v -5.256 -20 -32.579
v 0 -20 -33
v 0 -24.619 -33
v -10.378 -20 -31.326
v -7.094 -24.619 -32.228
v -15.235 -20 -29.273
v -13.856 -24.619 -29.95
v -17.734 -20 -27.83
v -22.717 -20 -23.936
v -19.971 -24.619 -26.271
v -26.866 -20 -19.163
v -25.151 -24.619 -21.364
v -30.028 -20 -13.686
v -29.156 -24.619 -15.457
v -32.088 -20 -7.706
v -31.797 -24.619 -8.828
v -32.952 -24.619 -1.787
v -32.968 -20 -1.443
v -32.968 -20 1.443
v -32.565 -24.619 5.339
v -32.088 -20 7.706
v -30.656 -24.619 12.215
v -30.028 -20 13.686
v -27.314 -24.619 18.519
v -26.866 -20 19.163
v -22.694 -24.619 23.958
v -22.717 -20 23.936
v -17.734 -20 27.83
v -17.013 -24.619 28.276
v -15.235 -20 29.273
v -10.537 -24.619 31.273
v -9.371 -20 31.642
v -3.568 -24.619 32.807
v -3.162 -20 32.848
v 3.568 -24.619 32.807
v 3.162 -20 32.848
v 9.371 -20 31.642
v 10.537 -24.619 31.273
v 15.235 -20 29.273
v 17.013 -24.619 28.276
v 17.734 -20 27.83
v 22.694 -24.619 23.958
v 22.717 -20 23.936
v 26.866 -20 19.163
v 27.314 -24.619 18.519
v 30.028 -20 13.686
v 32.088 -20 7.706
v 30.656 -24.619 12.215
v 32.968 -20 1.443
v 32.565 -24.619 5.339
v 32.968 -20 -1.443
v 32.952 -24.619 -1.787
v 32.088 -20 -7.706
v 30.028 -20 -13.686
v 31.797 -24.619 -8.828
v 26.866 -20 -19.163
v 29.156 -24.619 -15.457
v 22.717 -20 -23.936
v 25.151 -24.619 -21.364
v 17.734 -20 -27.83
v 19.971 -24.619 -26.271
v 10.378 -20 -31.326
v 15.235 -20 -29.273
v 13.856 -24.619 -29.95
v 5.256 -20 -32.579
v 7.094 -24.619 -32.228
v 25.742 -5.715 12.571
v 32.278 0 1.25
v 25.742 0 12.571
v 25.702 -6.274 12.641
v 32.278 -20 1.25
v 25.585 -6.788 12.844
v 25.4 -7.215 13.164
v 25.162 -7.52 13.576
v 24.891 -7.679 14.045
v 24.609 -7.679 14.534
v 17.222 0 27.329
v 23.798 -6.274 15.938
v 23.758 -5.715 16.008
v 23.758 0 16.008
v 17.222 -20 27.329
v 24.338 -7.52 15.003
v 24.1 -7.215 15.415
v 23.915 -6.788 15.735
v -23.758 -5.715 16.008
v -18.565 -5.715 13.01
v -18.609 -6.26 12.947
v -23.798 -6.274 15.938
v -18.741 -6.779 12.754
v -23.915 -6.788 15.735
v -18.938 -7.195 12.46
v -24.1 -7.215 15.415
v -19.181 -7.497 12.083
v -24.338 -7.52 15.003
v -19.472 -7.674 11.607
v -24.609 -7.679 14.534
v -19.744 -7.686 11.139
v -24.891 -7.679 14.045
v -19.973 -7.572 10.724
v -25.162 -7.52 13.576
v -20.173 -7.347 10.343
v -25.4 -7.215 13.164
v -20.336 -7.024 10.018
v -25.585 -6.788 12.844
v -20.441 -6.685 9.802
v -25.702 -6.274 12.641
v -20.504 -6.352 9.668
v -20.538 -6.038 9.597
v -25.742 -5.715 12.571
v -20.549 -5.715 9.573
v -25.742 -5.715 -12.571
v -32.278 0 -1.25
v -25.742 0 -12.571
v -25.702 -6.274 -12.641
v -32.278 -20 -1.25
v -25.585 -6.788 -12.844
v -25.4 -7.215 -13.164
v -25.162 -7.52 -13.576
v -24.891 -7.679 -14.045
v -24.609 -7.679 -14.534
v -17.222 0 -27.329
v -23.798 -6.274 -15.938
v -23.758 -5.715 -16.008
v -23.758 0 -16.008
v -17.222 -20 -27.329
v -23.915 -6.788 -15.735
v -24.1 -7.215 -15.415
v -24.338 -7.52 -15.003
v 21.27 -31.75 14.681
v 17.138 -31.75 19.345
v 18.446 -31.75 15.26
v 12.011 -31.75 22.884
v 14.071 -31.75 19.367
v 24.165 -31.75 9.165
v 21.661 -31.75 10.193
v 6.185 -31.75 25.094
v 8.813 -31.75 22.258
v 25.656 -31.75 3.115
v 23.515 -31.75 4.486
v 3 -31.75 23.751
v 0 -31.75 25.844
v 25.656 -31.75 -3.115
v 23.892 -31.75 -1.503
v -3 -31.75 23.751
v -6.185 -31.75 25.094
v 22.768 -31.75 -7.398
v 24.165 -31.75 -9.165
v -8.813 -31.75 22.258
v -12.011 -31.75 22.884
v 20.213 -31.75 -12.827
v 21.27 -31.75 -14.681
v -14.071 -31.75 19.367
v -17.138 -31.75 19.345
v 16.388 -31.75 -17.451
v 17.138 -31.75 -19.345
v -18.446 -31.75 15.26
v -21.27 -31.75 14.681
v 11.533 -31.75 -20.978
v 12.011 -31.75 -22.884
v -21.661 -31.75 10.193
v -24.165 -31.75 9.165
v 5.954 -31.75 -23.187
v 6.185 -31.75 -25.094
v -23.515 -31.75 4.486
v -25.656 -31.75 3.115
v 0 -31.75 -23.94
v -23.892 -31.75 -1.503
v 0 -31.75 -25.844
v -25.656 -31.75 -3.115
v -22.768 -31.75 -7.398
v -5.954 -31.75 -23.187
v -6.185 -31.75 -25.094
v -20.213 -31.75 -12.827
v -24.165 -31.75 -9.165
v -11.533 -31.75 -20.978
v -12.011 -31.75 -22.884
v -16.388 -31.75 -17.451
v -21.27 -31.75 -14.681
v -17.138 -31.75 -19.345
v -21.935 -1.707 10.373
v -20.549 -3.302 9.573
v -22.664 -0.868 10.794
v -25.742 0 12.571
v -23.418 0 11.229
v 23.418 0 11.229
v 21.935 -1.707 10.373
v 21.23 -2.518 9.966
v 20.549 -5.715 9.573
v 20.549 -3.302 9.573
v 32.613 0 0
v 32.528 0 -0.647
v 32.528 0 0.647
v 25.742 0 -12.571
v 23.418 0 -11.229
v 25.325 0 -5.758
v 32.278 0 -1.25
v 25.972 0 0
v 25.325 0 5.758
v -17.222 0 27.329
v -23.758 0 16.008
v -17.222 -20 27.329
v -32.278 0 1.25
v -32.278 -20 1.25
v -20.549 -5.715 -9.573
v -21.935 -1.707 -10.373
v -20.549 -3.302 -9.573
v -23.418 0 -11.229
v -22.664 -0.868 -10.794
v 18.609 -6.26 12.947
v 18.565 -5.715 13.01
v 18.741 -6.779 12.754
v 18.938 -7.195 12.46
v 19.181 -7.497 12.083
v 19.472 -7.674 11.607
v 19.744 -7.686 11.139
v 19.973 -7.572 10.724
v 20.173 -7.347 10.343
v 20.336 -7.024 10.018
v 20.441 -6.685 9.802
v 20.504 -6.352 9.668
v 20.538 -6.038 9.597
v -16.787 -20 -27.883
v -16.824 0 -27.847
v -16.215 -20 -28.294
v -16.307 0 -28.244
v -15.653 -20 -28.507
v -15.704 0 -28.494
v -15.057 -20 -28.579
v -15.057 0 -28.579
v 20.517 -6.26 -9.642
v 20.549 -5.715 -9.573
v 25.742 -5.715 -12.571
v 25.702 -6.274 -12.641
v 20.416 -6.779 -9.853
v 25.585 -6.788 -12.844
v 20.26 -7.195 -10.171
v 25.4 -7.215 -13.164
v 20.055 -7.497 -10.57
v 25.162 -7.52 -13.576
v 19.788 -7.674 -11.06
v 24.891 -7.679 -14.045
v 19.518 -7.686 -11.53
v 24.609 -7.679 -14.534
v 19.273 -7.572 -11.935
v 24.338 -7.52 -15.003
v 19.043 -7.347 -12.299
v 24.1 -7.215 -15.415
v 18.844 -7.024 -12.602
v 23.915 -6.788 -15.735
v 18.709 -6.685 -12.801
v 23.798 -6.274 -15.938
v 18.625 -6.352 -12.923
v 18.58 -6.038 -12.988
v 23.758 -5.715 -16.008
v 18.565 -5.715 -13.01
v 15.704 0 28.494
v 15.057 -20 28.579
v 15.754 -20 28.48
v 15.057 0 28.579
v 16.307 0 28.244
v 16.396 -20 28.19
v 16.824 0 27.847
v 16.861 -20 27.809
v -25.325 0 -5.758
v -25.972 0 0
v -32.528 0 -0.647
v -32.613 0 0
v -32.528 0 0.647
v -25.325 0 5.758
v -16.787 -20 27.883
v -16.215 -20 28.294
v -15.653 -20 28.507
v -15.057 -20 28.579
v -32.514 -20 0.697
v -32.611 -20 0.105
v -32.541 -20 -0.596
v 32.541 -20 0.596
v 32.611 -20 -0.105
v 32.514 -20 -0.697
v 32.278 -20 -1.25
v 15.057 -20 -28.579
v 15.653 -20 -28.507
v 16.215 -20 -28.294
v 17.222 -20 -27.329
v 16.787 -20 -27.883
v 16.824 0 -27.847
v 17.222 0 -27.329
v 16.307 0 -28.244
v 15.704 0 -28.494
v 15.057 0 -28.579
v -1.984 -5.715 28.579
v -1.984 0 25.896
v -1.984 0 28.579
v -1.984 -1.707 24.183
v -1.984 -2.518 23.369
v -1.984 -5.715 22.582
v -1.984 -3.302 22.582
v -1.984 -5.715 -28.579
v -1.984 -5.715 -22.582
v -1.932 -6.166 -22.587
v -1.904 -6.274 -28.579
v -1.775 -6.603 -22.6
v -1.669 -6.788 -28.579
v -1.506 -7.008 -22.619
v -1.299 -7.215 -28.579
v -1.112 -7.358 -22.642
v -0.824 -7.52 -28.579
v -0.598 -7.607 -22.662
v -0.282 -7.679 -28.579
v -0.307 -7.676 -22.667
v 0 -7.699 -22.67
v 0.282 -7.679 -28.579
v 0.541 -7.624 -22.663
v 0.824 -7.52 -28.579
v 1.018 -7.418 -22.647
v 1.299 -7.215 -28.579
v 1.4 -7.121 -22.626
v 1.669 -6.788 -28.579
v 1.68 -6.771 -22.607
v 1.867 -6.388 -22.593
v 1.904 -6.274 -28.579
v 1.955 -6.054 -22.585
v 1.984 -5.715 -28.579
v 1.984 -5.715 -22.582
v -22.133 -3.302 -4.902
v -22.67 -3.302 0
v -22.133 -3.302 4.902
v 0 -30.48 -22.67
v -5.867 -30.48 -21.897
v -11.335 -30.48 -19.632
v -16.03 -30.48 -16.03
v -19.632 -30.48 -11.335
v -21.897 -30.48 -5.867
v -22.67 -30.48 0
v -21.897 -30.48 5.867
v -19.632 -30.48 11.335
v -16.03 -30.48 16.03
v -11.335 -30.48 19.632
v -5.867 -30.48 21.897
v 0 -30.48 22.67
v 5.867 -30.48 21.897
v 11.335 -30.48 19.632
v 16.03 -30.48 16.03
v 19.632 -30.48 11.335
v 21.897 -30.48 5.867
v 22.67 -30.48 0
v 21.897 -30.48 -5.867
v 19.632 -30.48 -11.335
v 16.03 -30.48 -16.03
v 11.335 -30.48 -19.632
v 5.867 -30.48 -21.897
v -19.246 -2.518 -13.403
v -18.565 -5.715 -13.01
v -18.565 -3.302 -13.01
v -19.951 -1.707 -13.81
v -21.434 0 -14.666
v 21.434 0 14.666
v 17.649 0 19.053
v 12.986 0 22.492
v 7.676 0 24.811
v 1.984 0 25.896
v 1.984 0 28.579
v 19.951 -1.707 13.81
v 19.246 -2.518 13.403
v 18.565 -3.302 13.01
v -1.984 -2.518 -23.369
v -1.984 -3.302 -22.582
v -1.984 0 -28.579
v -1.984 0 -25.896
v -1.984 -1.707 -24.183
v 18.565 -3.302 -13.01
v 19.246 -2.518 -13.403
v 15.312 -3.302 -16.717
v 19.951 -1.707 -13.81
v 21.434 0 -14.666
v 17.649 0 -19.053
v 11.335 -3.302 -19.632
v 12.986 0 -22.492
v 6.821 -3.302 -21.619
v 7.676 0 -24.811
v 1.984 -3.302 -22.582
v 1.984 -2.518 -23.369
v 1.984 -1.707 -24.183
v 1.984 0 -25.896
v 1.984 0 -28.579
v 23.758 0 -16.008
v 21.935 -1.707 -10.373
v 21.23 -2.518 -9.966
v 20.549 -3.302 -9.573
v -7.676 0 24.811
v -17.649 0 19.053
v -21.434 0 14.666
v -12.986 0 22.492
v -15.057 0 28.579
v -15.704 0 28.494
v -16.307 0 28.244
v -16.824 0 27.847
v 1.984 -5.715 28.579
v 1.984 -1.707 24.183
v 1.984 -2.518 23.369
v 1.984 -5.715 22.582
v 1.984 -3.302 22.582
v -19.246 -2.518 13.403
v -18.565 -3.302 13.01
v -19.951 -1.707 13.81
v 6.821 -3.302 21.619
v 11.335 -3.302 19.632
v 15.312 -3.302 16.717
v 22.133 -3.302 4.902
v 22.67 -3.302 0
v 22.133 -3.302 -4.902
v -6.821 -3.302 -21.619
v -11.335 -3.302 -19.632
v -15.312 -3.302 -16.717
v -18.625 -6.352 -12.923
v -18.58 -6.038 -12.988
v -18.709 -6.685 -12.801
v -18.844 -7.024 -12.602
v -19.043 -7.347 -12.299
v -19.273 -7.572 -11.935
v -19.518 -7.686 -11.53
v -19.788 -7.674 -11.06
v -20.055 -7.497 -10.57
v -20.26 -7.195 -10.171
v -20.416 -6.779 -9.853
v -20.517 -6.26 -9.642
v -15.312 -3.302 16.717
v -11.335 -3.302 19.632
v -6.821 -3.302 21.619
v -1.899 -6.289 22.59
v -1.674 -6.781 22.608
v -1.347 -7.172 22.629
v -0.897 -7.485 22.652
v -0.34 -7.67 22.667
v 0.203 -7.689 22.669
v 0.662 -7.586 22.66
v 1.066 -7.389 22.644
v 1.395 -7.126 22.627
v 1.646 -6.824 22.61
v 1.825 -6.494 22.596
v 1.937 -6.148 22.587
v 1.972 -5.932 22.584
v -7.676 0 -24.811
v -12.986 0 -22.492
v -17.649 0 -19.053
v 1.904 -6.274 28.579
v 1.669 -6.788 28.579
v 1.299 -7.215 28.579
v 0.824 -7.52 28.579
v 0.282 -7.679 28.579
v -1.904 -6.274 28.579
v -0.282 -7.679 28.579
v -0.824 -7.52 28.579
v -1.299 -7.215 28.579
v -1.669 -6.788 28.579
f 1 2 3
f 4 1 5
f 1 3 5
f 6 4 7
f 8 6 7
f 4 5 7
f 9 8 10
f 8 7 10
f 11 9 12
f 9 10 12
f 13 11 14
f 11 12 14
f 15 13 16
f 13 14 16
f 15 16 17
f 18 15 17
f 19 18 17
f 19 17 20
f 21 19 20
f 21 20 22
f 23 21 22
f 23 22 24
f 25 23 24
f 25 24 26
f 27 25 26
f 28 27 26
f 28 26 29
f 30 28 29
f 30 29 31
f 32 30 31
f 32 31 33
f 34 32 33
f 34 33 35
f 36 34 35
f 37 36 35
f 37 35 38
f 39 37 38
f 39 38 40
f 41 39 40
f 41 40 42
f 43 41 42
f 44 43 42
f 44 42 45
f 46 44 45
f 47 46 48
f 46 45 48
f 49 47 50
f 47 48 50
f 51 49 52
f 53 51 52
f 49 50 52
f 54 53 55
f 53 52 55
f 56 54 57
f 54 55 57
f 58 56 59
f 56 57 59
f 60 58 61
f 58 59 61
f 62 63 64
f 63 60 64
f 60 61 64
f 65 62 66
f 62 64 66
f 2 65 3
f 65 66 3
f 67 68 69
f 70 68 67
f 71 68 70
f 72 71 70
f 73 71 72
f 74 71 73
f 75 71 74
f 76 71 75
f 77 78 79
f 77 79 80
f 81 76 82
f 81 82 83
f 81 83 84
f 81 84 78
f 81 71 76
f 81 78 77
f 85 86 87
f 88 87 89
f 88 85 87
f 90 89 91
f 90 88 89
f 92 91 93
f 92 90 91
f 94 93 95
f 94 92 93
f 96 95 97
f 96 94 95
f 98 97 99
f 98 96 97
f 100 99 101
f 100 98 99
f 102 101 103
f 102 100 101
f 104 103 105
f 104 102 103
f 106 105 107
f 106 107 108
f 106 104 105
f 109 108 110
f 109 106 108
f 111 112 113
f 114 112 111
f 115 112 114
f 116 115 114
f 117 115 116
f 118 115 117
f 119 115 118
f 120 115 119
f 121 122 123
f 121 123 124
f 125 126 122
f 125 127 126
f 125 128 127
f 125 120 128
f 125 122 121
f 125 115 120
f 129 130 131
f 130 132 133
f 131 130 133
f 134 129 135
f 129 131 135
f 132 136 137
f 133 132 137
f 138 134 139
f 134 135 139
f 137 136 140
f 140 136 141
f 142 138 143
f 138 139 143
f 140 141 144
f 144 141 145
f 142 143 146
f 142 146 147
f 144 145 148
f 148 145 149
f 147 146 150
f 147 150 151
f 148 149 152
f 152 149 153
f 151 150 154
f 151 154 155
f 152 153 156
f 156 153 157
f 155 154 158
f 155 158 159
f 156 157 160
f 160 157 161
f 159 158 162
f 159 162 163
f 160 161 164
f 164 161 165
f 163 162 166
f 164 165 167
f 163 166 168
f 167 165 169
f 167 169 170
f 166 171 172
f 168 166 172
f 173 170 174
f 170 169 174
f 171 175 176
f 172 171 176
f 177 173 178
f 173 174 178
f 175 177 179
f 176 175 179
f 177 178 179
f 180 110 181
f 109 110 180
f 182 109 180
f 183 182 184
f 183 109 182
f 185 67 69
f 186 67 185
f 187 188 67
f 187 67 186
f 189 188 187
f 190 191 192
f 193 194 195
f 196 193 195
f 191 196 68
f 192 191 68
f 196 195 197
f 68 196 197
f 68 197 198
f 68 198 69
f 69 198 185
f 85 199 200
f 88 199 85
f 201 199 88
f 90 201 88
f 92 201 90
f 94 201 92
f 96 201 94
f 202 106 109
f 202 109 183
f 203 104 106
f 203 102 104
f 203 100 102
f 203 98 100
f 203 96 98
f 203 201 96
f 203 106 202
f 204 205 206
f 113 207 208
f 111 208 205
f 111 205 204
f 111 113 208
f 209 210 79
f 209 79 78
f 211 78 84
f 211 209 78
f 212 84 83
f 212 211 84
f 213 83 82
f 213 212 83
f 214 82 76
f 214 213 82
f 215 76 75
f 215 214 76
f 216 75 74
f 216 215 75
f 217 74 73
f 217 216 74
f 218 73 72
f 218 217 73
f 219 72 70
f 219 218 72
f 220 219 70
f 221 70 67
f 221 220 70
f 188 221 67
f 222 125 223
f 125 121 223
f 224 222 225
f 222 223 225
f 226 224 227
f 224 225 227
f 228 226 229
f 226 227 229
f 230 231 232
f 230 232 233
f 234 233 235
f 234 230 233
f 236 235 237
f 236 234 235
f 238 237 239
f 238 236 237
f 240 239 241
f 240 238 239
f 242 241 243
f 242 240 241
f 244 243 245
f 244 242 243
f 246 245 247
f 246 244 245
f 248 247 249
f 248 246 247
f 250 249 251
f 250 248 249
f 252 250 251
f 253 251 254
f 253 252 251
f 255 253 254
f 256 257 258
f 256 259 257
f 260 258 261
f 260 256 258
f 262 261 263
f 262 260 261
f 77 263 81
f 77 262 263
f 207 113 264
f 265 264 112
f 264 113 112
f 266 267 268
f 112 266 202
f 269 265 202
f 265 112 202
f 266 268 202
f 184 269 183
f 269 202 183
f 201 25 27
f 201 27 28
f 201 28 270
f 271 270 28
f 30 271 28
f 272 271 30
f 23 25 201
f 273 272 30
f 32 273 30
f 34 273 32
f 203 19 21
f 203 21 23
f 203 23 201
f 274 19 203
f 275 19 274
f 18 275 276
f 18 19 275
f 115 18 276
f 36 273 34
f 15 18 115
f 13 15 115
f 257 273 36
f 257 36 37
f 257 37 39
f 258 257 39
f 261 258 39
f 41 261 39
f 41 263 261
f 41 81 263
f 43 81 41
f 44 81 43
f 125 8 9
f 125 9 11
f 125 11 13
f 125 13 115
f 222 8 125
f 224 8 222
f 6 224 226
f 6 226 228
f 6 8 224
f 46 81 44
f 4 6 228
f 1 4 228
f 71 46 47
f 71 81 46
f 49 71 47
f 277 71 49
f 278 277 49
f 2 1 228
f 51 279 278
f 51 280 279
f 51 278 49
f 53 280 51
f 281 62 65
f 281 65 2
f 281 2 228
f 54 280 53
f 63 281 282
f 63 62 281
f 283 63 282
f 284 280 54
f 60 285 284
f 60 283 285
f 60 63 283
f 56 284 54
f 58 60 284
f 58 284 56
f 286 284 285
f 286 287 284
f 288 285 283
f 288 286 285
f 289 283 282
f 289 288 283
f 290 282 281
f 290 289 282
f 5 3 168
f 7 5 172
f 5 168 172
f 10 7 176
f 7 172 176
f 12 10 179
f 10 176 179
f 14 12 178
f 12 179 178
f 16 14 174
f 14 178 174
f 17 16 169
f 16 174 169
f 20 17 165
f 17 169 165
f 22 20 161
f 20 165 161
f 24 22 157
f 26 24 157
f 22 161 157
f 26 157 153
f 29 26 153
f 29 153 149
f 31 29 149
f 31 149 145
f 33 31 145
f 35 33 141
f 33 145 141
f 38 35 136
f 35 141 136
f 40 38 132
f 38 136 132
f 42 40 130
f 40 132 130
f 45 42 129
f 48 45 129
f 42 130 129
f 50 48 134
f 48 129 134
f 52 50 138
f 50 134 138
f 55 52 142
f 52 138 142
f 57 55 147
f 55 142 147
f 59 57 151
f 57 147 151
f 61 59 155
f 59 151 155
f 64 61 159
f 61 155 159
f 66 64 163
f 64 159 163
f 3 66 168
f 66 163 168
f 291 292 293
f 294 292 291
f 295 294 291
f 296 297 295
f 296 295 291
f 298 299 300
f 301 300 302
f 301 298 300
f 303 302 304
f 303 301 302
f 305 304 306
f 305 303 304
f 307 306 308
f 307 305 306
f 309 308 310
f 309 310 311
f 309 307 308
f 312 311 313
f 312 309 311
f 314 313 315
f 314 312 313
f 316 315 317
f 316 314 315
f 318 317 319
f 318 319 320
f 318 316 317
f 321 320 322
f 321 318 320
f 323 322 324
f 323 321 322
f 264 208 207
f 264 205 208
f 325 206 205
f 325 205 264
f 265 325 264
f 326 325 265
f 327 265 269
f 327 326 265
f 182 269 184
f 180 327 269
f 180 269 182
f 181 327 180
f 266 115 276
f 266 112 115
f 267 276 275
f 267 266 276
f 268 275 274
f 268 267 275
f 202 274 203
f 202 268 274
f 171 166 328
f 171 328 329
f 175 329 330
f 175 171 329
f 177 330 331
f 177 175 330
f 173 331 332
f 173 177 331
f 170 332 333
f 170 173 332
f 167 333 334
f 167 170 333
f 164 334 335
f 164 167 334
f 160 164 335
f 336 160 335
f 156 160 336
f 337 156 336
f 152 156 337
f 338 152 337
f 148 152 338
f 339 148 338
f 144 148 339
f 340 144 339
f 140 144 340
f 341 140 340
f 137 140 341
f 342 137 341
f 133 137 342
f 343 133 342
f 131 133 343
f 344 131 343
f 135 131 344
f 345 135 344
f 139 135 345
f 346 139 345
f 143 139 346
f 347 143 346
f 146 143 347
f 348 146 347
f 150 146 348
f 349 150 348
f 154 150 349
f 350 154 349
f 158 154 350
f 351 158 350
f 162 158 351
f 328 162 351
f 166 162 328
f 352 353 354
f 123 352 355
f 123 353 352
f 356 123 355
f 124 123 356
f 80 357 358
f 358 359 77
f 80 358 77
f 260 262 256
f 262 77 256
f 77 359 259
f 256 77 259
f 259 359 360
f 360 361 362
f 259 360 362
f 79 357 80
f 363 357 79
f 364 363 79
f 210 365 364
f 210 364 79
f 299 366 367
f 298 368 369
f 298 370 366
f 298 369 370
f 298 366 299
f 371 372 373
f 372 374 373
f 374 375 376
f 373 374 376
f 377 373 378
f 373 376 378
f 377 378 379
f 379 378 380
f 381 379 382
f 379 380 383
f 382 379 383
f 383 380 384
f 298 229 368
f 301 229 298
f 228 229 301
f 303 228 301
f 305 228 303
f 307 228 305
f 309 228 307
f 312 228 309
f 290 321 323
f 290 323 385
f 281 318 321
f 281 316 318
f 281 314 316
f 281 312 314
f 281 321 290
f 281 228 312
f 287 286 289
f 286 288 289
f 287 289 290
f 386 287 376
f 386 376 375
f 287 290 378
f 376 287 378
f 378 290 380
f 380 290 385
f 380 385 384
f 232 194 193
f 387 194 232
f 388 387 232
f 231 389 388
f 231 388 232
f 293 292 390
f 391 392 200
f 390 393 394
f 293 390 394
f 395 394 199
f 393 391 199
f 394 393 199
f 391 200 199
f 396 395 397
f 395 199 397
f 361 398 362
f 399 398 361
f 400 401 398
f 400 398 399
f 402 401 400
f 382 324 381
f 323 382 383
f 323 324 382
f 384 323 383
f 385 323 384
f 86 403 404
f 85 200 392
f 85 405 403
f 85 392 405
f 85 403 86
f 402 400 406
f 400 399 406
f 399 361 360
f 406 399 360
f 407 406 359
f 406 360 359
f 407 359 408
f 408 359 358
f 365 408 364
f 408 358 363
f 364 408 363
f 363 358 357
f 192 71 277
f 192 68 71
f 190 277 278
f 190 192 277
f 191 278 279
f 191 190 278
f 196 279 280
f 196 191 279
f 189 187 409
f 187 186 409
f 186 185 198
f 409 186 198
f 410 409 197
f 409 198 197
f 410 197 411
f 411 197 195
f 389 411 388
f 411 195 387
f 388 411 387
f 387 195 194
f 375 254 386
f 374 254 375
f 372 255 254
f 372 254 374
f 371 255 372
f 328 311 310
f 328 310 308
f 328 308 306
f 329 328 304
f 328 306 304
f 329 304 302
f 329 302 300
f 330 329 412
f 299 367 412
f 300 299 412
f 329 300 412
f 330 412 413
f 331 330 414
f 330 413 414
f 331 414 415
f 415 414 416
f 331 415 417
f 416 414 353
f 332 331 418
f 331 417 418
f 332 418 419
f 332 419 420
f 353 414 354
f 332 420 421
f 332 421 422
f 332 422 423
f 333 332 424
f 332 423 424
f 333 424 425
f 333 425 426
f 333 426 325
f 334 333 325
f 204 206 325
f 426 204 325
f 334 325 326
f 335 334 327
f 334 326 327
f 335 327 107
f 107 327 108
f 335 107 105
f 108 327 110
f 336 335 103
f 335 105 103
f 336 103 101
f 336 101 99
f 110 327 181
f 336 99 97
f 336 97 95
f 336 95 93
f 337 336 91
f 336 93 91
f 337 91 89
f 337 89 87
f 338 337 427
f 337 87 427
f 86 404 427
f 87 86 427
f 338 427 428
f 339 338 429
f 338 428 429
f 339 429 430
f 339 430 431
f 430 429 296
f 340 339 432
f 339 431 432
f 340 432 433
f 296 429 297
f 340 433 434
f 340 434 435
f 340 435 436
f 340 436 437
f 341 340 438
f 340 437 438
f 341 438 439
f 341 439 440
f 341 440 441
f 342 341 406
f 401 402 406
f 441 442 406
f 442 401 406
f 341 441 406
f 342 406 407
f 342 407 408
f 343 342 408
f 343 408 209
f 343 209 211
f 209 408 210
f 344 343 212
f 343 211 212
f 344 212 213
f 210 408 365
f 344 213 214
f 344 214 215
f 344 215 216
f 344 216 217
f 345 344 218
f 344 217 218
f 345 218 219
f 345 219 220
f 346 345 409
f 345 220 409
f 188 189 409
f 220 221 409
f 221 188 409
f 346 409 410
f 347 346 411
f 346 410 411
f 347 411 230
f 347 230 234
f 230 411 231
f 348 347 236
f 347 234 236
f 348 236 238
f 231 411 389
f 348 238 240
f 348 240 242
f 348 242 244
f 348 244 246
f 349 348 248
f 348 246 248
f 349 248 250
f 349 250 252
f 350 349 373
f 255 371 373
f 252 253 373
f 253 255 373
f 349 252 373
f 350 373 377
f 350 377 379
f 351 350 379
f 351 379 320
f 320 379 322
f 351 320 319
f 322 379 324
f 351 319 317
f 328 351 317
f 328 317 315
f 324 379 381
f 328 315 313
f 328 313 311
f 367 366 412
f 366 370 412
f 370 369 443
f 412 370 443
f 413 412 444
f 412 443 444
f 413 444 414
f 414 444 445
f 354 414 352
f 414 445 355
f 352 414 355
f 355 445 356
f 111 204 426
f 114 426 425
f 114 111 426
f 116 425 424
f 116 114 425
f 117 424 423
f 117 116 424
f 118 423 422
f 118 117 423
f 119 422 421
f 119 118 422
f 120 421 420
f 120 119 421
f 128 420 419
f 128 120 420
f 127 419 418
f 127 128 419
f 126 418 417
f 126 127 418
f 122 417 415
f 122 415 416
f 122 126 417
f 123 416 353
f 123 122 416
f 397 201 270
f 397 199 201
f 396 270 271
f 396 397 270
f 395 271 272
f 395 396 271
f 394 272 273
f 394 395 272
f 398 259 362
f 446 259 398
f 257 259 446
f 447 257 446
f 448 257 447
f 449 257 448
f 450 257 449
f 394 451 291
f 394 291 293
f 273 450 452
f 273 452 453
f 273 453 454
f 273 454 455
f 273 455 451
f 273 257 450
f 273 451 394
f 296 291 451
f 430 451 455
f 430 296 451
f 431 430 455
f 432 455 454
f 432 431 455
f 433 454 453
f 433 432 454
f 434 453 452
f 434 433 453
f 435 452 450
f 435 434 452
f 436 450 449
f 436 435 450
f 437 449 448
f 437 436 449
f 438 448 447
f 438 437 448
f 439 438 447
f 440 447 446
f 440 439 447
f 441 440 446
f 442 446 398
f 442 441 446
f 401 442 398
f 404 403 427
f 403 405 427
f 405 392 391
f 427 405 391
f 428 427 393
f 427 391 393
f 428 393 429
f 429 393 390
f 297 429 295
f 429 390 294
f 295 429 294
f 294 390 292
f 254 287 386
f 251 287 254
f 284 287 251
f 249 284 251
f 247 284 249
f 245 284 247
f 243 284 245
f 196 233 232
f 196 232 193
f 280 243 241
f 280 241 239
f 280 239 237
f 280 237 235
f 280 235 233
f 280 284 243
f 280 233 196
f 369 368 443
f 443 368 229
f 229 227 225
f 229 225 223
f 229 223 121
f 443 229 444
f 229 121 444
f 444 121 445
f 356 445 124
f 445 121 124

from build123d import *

# Parameters (mm, degrees)
CUT_EXTRUDE5_START = -20
CUT_EXTRUDE5_DEPTH = 20
FILLET4_R          = 2.5
CUT_EXTRUDE6_START = -86.02405492
CUT_EXTRUDE6_DEPTH = 143.469271841
CIRPATTERN2_COUNT  = 6
CHAMFER1_SIZE      = 3.302
CHAMFER2_SIZE      = 1.27


with BuildPart() as part:
    # Sketch1 → Revolve1 (revolve)
    with BuildSketch(Plane(origin=(0, 0, 0), x_dir=(0, 0, -1), z_dir=(1, 0, 0)), mode=Mode.PRIVATE) as revolve1_sk:
        Polygon((-22.6695, -31.75), (-22.6695, 0), (-33, 0), (-33, -24.619433914), (-25.8445, -31.75), align=None)
    revolve(revolve1_sk.sketch.rotate(Axis((0, 0, 0), (0, 1, 0)), 180), axis=Axis((0, 0, 0), (0, 1, 0)))

    # Sketch4 → Cut-Extrude5 (cut)
    with BuildSketch(Plane(origin=(0, 0, 0), x_dir=(1, 0, 0), z_dir=(0, 1, 0)).offset(CUT_EXTRUDE5_START)):
        with BuildLine():
            ThreePointArc((33, 0), (28.578838325, 16.5), (16.5, 28.578838325))
            Line((16.5, 28.578838325), (33, 0))
        make_face()
        with BuildLine():
            Line((-16.5, 28.578838325), (16.5, 28.578838325))
            ThreePointArc((16.5, 28.578838325), (0, 33), (-16.5, 28.578838325))
        make_face()
        with BuildLine():
            Line((-33, 0), (-16.5, 28.578838325))
            ThreePointArc((-16.5, 28.578838325), (-28.578838325, 16.5), (-33, 0))
        make_face()
        with BuildLine():
            ThreePointArc((16.5, -28.578838325), (28.578838325, -16.5), (33, 0))
            Line((33, 0), (16.5, -28.578838325))
        make_face()
        with BuildLine():
            Line((-16.5, -28.578838325), (-33, 0))
            ThreePointArc((-33, 0), (-28.578838325, -16.5), (-16.5, -28.578838325))
        make_face()
        with BuildLine():
            ThreePointArc((-16.5, -28.578838325), (0, -33), (16.5, -28.578838325))
            Line((16.5, -28.578838325), (-16.5, -28.578838325))
        make_face()
    extrude(amount=CUT_EXTRUDE5_DEPTH, mode=Mode.SUBTRACT)

    # Fillet4
    fillet4_edges = [part.edges().sort_by_distance(p)[0] for p in [
        (33, -10, 0),
        (16.5, -10, -28.578838325),
        (-33, -10, 0),
        (16.5, -10, 28.578838325),
        (-16.5, -10, -28.578838325),
        (-16.5, -10, 28.578838325),
    ]]
    fillet(fillet4_edges, radius=FILLET4_R)

    # Sketch7 → Cut-Extrude6 (cut)
    with BuildSketch(Plane.XY.offset(CUT_EXTRUDE6_START)):
        with BuildLine():
            Line((-1.984375, 0), (-1.984375, -5.715))
            ThreePointArc((-1.984375, -5.715), (0, -7.699375), (1.984375, -5.715))
            Line((1.984375, -5.715), (1.984375, 0))
            Line((1.984375, 0), (0, 0))
            Line((0, 0), (-1.984375, 0))
        make_face()
    cut_extrude6 = extrude(amount=CUT_EXTRUDE6_DEPTH, mode=Mode.SUBTRACT)

    # CirPattern2: Cut-Extrude6 ×6 about axis
    cirpattern2_axis = Axis((0, 0, 0), (0, 1, 0))
    for i in range(1, CIRPATTERN2_COUNT):
        add(cut_extrude6.rotate(cirpattern2_axis, i * 360 / CIRPATTERN2_COUNT), mode=Mode.SUBTRACT)

    # Chamfer1
    chamfer1_edges = [part.edges().sort_by_distance(p)[0] for p in [
        (-11.33475, 0, 19.632362891),
        (-22.6695, 0, 0),
        (-11.33475, 0, -19.632362891),
        (22.6695, 0, 0),
        (11.33475, 0, 19.632362891),
        (11.33475, 0, -19.632362891),
    ]]
    chamfer(chamfer1_edges, length=CHAMFER1_SIZE)

    # Chamfer2
    chamfer2_edges = [part.edges().sort_by_distance(p)[0] for p in [
        (0, -31.75, 22.6695),
    ]]
    chamfer(chamfer2_edges, length=CHAMFER2_SIZE)


solid = part.part
